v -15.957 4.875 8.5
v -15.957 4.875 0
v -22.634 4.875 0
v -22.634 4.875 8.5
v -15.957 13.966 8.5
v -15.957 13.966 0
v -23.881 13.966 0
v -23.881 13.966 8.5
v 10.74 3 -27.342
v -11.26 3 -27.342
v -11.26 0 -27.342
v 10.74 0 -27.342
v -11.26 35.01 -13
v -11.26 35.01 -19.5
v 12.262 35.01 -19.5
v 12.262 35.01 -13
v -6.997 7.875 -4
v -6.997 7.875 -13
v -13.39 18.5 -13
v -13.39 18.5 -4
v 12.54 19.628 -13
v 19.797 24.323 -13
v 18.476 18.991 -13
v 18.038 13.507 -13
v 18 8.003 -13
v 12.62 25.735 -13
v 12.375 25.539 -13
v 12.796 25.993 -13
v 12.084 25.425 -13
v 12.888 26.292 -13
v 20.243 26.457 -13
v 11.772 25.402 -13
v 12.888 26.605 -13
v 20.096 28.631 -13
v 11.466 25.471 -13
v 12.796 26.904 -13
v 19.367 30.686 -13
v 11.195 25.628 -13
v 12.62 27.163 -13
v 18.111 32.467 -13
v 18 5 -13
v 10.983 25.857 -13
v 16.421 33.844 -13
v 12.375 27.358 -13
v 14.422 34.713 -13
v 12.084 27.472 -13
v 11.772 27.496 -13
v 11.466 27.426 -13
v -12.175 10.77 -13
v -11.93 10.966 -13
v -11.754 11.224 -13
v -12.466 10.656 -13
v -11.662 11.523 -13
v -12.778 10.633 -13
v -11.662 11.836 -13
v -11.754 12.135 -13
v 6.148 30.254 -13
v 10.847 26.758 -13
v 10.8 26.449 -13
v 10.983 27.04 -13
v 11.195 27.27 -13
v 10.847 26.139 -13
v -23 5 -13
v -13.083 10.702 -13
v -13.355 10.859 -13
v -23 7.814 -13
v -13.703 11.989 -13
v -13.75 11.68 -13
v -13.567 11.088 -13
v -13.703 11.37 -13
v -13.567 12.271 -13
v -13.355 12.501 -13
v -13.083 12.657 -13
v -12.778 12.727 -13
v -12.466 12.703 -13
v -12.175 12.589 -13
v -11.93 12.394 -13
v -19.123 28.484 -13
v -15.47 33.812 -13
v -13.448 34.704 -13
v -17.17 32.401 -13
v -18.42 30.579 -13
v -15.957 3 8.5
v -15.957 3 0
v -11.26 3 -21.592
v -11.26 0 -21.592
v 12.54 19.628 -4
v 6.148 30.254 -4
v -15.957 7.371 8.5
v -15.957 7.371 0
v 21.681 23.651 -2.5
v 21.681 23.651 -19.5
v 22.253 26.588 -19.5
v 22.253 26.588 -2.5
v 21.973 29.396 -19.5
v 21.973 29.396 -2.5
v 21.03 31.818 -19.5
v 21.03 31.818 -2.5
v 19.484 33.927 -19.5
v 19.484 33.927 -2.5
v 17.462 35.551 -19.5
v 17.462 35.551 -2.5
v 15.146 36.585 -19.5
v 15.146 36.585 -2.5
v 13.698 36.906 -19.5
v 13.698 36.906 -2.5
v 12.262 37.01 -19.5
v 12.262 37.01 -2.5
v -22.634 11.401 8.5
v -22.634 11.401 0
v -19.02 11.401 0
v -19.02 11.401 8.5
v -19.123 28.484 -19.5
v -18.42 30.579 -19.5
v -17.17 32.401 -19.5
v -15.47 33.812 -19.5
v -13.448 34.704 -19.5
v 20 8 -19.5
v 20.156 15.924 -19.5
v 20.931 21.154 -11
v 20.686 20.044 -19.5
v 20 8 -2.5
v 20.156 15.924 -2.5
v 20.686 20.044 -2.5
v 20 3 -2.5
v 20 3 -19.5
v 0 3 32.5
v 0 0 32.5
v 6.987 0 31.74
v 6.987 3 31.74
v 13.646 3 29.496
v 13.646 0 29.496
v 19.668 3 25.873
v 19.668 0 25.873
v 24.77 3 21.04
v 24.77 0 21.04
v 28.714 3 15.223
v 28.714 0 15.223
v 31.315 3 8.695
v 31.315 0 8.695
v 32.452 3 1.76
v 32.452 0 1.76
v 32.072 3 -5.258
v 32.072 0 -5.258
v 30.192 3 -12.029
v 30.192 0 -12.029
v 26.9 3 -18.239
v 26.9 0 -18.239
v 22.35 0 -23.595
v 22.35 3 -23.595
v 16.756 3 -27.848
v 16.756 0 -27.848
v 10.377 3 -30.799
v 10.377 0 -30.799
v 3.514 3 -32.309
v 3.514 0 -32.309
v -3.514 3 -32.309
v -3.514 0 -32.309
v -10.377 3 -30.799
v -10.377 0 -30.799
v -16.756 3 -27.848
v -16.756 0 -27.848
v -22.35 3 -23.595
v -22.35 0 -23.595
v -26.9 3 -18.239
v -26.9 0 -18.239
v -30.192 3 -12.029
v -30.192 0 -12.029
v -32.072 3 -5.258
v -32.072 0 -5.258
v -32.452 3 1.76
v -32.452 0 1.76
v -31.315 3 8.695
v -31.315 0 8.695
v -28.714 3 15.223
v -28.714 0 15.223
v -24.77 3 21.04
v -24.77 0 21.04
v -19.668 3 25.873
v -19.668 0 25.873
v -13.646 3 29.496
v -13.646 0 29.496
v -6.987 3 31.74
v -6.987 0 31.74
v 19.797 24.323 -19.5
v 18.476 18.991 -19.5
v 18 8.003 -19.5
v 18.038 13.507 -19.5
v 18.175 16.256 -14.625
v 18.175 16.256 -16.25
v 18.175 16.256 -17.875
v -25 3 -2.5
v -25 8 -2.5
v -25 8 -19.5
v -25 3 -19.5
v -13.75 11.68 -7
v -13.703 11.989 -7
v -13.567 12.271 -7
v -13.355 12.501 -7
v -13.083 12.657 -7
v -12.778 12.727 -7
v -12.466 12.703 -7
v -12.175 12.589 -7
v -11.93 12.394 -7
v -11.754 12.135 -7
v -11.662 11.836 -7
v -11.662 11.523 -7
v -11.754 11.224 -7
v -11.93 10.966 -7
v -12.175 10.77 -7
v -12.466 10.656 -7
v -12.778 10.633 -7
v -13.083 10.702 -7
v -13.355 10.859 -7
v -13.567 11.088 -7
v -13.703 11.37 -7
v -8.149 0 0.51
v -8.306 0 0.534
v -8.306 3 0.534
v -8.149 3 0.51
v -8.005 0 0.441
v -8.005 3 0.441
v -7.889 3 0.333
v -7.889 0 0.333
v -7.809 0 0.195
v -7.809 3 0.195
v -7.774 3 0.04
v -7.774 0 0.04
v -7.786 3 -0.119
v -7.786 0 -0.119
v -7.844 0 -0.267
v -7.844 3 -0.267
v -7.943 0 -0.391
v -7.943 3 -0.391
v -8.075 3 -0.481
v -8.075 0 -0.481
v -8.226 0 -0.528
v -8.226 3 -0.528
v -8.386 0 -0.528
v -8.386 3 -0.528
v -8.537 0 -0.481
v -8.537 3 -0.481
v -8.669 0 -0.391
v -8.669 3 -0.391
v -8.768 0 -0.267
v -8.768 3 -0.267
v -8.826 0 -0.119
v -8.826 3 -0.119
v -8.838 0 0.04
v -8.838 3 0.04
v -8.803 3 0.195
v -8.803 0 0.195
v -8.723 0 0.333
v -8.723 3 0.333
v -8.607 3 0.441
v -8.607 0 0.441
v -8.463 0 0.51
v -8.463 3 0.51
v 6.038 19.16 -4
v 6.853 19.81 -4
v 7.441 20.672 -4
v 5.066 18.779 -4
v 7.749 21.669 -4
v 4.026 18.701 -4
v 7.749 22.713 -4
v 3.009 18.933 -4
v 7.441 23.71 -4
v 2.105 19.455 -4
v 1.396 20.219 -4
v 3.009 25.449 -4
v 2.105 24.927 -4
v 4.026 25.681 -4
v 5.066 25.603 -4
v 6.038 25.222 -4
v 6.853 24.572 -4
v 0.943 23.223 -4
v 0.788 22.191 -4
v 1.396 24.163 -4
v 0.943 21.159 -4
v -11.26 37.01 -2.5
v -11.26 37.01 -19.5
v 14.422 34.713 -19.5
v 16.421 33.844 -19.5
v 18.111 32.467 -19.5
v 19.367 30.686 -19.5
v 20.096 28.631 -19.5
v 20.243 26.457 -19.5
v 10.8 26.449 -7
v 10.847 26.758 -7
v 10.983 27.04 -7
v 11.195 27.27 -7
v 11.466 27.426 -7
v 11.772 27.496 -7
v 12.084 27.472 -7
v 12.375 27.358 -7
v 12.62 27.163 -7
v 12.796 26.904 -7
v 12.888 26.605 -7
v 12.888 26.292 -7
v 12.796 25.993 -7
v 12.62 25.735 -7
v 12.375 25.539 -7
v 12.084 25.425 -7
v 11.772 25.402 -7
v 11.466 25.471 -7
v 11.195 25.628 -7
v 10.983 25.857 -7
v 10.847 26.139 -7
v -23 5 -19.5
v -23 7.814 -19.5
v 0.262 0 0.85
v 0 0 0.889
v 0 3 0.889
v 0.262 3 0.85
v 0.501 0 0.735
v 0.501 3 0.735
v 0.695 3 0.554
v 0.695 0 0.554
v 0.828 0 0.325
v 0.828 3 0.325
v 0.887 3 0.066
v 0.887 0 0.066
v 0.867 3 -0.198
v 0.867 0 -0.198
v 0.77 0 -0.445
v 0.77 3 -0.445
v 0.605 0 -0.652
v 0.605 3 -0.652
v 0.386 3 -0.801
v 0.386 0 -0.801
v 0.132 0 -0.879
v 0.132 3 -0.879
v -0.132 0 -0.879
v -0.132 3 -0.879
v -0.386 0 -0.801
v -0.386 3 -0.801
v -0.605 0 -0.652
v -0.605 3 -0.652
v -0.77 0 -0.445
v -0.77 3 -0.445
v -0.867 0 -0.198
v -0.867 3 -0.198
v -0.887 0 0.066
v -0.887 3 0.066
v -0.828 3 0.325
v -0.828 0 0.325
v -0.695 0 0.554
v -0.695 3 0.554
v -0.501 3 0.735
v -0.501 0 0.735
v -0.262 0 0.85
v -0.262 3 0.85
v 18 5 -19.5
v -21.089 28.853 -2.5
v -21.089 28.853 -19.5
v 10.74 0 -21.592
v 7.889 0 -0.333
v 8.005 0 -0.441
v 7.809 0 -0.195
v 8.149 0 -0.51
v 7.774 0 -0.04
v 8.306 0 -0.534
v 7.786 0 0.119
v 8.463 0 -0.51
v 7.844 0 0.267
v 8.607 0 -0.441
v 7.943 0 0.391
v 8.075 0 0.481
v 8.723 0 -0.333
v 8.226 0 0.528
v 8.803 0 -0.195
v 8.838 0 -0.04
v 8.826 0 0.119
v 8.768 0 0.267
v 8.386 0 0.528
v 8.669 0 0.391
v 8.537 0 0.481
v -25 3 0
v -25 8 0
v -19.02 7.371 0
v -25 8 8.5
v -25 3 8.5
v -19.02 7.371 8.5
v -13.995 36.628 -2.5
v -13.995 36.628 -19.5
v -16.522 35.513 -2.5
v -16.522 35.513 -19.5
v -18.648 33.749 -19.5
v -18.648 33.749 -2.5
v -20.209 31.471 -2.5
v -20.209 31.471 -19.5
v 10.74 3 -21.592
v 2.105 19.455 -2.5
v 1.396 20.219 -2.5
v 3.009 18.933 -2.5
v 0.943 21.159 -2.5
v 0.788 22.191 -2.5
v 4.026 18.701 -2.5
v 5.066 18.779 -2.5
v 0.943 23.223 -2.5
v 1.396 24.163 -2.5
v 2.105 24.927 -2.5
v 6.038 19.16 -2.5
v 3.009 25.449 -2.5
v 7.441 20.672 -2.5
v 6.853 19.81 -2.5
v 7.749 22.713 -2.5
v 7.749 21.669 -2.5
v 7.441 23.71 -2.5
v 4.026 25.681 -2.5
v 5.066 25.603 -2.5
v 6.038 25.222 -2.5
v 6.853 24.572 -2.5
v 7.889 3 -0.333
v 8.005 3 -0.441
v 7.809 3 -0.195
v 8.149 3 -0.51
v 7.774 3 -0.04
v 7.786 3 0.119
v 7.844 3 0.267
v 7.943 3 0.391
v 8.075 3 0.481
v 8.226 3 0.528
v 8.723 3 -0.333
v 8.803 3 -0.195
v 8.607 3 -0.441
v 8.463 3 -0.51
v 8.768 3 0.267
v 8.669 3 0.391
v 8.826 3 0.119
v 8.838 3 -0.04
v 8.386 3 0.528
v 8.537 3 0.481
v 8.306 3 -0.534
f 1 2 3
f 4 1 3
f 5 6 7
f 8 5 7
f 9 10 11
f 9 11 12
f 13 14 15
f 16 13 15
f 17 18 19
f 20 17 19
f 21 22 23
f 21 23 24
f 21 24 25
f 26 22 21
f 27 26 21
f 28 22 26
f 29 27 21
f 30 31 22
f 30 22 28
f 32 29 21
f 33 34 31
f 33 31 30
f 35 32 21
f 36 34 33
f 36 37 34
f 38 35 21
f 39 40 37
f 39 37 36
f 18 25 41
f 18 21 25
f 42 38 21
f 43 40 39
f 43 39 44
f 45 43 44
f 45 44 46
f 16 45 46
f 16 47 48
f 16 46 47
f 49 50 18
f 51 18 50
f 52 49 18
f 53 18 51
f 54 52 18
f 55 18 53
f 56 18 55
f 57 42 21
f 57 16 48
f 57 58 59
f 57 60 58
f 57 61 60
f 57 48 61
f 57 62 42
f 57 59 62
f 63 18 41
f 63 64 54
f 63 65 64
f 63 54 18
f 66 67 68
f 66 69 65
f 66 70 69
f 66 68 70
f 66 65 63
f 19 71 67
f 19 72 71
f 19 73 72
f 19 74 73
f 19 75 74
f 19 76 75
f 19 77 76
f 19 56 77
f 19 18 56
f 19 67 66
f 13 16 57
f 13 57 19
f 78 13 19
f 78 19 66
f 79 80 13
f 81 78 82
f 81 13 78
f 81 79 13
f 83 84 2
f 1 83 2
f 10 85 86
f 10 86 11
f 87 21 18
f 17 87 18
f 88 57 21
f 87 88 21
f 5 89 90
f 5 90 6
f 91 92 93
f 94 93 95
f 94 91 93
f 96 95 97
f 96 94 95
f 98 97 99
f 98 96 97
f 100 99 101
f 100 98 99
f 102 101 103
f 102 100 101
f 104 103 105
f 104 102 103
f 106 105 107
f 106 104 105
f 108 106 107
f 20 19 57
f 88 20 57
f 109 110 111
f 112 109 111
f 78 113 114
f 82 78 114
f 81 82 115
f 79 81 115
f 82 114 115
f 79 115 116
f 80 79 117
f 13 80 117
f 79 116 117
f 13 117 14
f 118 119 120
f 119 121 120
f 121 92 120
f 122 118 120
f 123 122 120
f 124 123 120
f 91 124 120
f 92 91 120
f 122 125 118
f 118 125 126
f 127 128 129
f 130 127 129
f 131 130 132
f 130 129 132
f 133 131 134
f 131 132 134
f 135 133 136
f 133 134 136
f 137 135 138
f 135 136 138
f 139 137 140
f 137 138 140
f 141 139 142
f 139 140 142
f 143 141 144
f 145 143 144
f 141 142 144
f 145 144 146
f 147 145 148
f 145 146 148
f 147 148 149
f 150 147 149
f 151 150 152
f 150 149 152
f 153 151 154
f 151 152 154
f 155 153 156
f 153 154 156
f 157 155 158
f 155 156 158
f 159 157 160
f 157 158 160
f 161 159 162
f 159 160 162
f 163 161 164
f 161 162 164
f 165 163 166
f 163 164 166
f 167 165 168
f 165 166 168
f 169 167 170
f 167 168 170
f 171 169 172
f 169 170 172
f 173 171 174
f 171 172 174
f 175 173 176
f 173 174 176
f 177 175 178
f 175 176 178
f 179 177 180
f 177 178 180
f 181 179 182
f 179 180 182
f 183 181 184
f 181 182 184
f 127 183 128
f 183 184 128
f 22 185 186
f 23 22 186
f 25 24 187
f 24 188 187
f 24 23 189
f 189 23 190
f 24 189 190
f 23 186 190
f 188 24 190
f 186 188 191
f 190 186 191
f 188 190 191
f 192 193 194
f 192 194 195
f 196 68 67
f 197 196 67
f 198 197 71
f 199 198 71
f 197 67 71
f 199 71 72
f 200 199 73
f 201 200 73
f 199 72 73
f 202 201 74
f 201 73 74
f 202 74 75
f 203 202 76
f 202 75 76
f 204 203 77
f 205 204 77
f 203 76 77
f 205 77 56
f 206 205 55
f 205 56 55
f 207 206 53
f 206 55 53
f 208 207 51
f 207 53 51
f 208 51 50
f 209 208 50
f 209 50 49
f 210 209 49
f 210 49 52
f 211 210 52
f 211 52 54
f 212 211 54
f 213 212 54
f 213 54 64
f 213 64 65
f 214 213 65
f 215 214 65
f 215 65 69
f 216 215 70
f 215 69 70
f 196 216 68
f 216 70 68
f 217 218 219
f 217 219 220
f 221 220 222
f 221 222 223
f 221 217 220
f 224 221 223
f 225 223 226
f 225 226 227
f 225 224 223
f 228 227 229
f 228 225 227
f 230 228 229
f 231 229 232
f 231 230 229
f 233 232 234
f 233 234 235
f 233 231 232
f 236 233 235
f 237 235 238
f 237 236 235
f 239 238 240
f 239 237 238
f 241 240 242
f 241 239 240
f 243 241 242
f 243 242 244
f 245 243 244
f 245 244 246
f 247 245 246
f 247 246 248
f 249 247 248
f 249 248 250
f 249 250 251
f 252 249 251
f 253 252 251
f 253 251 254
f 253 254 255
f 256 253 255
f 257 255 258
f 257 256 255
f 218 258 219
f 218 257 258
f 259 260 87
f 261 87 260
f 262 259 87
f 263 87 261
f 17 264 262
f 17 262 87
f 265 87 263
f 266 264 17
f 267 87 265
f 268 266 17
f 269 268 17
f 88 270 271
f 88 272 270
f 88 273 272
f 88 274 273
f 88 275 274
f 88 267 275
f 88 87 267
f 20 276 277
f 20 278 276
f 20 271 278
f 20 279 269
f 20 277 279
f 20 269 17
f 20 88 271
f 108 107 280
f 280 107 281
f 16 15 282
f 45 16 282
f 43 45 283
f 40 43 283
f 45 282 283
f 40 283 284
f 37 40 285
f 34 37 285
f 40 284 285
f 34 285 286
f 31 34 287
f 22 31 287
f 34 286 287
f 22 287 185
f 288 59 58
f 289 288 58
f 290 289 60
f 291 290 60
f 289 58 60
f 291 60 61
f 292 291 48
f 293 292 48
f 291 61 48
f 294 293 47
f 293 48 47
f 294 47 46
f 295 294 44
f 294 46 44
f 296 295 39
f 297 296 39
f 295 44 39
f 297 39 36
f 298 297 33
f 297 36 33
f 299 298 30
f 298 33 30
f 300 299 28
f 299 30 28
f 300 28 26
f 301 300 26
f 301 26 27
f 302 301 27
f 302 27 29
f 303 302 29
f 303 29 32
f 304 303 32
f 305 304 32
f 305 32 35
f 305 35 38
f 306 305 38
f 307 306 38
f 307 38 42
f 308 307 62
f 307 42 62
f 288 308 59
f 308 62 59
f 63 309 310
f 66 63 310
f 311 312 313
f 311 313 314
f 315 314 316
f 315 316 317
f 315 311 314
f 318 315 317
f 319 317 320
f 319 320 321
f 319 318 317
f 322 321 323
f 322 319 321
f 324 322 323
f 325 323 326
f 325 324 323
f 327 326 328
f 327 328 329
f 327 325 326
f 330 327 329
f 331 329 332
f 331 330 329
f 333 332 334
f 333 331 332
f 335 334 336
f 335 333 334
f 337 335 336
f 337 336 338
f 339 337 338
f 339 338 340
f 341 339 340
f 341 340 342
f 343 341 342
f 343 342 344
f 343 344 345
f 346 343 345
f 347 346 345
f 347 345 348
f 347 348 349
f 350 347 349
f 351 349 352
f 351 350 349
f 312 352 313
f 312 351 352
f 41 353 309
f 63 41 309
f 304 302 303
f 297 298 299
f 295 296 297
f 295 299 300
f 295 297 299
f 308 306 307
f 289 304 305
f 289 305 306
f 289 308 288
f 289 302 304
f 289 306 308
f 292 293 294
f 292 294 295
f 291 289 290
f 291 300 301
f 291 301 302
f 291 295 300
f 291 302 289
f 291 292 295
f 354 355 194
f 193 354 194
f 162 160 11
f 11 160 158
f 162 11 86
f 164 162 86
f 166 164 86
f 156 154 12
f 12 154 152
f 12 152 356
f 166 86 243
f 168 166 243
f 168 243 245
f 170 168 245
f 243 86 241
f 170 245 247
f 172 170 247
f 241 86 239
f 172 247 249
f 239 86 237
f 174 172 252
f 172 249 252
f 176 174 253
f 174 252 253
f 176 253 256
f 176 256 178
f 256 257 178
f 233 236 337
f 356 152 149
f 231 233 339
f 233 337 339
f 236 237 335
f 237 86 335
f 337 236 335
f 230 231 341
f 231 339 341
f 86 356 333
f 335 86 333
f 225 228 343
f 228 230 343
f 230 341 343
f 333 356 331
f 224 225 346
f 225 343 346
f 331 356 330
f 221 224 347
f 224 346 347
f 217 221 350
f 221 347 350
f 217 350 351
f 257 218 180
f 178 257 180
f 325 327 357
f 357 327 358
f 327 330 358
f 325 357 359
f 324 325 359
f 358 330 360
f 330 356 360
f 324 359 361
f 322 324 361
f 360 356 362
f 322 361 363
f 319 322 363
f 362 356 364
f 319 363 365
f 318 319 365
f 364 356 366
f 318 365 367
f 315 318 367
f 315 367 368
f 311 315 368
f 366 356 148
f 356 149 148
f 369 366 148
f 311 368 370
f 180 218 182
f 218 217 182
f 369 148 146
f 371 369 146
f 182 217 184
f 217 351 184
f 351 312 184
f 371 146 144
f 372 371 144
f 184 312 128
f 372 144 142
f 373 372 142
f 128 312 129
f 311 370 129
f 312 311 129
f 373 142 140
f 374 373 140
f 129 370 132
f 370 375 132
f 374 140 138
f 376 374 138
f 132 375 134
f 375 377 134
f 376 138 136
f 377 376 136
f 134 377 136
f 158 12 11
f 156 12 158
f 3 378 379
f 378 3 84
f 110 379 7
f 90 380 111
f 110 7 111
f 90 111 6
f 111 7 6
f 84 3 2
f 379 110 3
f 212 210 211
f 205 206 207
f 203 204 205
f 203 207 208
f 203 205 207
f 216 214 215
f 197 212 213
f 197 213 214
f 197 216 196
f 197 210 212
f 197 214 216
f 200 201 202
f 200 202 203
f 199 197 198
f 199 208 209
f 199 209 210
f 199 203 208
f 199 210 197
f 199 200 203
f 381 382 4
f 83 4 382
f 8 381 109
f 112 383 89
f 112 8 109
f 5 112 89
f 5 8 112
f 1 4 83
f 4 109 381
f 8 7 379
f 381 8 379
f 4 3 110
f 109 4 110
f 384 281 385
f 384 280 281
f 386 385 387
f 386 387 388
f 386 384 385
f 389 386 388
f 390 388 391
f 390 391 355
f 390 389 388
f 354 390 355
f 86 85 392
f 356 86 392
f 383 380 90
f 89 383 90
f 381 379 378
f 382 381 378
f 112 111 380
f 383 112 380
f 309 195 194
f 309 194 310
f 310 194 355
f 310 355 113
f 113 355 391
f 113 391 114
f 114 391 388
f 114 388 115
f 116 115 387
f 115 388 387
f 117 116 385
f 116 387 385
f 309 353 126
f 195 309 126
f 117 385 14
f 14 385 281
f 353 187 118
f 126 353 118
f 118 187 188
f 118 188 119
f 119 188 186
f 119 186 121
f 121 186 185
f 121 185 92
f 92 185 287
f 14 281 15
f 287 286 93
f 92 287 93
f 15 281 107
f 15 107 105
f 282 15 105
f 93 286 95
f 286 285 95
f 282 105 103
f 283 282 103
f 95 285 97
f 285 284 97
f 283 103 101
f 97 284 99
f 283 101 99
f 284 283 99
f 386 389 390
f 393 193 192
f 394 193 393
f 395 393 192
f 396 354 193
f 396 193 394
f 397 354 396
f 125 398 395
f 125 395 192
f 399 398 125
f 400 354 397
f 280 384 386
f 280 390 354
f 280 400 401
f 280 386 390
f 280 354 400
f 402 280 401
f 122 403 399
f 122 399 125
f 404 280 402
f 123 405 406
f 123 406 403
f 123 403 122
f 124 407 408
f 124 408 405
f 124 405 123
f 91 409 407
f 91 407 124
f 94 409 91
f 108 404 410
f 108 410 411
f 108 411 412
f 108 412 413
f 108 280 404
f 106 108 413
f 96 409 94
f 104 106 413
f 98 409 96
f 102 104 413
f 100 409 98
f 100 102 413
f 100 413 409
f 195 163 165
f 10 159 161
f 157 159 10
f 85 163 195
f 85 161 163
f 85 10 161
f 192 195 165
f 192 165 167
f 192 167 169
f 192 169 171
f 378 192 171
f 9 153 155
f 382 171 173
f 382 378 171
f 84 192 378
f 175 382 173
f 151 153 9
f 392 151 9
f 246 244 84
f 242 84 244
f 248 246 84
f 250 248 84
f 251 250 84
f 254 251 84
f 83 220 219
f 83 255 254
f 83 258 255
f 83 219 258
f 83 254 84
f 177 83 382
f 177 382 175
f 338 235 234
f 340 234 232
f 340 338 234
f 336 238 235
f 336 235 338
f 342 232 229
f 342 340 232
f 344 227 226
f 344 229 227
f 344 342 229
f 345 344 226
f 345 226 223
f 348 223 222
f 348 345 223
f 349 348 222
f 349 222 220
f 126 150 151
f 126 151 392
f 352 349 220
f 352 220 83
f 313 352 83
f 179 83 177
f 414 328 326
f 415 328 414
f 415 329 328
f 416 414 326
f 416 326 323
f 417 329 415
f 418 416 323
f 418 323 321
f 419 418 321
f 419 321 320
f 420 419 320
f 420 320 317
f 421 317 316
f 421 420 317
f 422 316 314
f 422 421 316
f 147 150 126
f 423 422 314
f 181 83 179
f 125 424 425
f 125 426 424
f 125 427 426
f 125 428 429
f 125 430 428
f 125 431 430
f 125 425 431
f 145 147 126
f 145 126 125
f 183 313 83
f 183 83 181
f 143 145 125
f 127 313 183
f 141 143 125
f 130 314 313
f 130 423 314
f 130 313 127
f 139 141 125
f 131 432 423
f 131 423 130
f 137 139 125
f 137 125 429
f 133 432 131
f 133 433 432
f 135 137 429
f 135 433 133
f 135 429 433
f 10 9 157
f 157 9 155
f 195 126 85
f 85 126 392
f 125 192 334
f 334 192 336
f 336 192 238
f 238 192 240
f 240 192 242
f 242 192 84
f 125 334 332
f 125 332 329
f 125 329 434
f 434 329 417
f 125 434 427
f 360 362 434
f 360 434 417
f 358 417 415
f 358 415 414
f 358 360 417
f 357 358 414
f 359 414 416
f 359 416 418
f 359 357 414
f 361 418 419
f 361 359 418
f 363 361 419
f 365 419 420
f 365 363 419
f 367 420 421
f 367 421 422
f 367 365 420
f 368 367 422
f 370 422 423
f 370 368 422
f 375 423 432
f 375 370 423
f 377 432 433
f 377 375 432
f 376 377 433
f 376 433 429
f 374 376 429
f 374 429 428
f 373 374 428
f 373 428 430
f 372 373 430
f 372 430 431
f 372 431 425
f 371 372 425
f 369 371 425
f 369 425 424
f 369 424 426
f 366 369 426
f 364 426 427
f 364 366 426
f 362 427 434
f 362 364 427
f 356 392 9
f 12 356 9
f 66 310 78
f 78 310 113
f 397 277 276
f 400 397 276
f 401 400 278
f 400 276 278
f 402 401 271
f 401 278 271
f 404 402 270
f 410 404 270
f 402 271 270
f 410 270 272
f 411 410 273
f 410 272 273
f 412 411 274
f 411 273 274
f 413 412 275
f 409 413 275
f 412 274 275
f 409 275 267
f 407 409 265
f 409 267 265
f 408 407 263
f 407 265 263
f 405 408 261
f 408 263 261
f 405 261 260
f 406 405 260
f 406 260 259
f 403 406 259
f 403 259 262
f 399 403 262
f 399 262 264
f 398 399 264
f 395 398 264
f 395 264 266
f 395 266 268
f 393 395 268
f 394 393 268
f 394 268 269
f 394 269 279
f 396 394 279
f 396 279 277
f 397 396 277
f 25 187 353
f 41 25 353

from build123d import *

# Parameters (mm, degrees)
SKETCH1_R           = 32.5
SKETCH1_R_2         = 0.889
SKETCH1_R_3         = 0.5335
BOSS_EXTRUDE1_DEPTH = 3
SKETCH2_W           = 45
SKETCH2_H           = 17
BOSS_EXTRUDE2_DEPTH = 5
LOFT1_START         = -19.5
LOFT1_DEPTH         = 17
FILLET2_R           = 10
CUT_EXTRUDE7_DEPTH  = 6.5
CUT_EXTRUDE8_DEPTH  = 9
SKETCH59_R          = 1.05
CUT_EXTRUDE9_DEPTH  = 6
SKETCH60_R          = 3.5
CUT_EXTRUDE10_DEPTH = 62.304245363
BOSS_EXTRUDE3_DEPTH = 11
CUT_EXTRUDE11_REACH = 53.415
SKETCH62_W          = 9.042987319
SKETCH62_H          = 2.5
SKETCH63_W          = 22
SKETCH63_H          = 5.75
CUT_EXTRUDE12_DEPTH = 10


# Read off the part's stored shape, not the designer's step: Loft1
with BuildPart() as part:
    # Sketch1 → Boss-Extrude1 (new body)
    with BuildSketch(Plane(origin=(0, 0, 0), x_dir=(1, 0, 0), z_dir=(0, 1, 0))):
        with Locations(Location((0, 0, 0), (0, 0, 270))):
            Circle(SKETCH1_R)
        with Locations(Location((0, 0, 0), (0, 0, 270))):
            Circle(SKETCH1_R_2, mode=Mode.SUBTRACT)
        with Locations(Location((-8.306, 0, 0), (0, 0, 270))):
            Circle(SKETCH1_R_3, mode=Mode.SUBTRACT)
        with Locations(Location((8.306, 0, 0), (0, 0, 90))):
            Circle(SKETCH1_R_3, mode=Mode.SUBTRACT)
    extrude(amount=BOSS_EXTRUDE1_DEPTH)

    # Sketch2 → Boss-Extrude2 (add)
    with BuildSketch(Plane(origin=(0, 3, 0), x_dir=(1, 0, 0), z_dir=(0, 1, 0))):
        with Locations((-2.5, 11)):
            Rectangle(SKETCH2_W, SKETCH2_H)
    extrude(amount=BOSS_EXTRUDE2_DEPTH)

    # Loft1 outline → Loft1 (add)
    with BuildSketch(Plane.XY.offset(LOFT1_START)):
        with BuildLine():
            Line((-25, 8), (20, 8))
            add(Edge.make_bspline(
                [(20, 8), (20.013119001, 12.366637273), (19.711715011, 23.342908392), (26.277458631, 32.792620463), (30.786821215, 37.0096)],
                knots=[0, 0, 0, 0, 0.412101617, 1, 1, 1, 1], degree=3))
            Line((30.786821215, 37.0096), (-19.558686419, 37.0096))
            Line((-19.558686419, 37.0096), (-25, 8))
        make_face()
    extrude(amount=LOFT1_DEPTH)

    # Fillet2
    fillet2_edges = [part.edges().sort_by_distance(p)[0] for p in [
        (30.786821215, 37.0096, -11),
        (-19.558686419, 37.0096, -11),
    ]]
    fillet(fillet2_edges, radius=FILLET2_R)

    # Sketch56 → Cut-Extrude7 (cut)
    with BuildSketch(Plane(origin=(0, 0, -19.5), x_dir=(-1, 0, 0), z_dir=(0, 0, -1))):
        with BuildLine():
            Line((11.259989716, 35.0096), (-12.262162003, 35.0096))
            ThreePointArc((-12.262162003, 35.0096), (-18.800326154, 31.619633572), (-19.797451062, 24.322702384))
            add(Edge.make_bspline(
                [(-19.797451062, 24.322702384), (-19.33456189, 23.024549565), (-18.970633179, 21.699807372), (-18.444923303, 18.9960086), (-18.278988003, 17.628977113), (-18.070720499, 14.883614823), (-18.028473243, 13.506968306), (-17.995025378, 10.755326884), (-18.004134147, 9.379048249), (-18, 8.003004365)],
                knots=[0, 0, 0, 0, 0.25, 0.25, 0.5, 0.5, 0.75, 0.75, 1, 1, 1, 1], degree=3))
            Line((-18, 8.003004365), (-18, 5))
            Line((-18, 5), (23, 5))
            Line((23, 5), (23, 7.814051971))
            Line((23, 7.814051971), (19.122868337, 28.484435511))
            ThreePointArc((19.122868337, 28.484435511), (16.368870019, 33.165844151), (11.259989716, 35.0096))
        make_face()
    extrude(amount=-CUT_EXTRUDE7_DEPTH, mode=Mode.SUBTRACT)

    # Sketch57 → Cut-Extrude8 (cut)
    with BuildSketch(Plane(origin=(0, 0, -13), x_dir=(-1, 0, 0), z_dir=(0, 0, -1))):
        Polygon((-6.147589592, 30.253616288), (-12.539757722, 19.62816634), (6.997359924, 7.874824939), (13.389528054, 18.500274887), align=None)
    extrude(amount=-CUT_EXTRUDE8_DEPTH, mode=Mode.SUBTRACT)

    # Sketch59 → Cut-Extrude9 (cut)
    with BuildSketch(Plane(origin=(0, 0, -13), x_dir=(-1, 0, 0), z_dir=(0, 0, -1))):
        with Locations((-11.850080197, 26.448721296)):
            Circle(SKETCH59_R)
        with Locations((12.699850529, 11.679719931)):
            Circle(SKETCH59_R)
    extrude(amount=-CUT_EXTRUDE9_DEPTH, mode=Mode.SUBTRACT)

    # Sketch60 → Cut-Extrude10 (cut, through all)
    with BuildSketch(Plane(origin=(0, 0, -4), x_dir=(-1, 0, 0), z_dir=(0, 0, -1))):
        with Locations((-4.287675332, 22.191003874)):
            Circle(SKETCH60_R)
    extrude(amount=-CUT_EXTRUDE10_DEPTH, mode=Mode.SUBTRACT)

    # Sketch61 → Boss-Extrude3 (add)
    with BuildSketch(Plane.XY.offset(-2.5)):
        Polygon((-25, 3), (-15.957012681, 3), (-15.957012681, 4.875346451), (-22.634257591, 4.875346451), (-22.634257591, 8.517700202), (-22.634257591, 11.401095106), (-19.020402646, 11.401095106), (-19.020402646, 7.370992949), (-15.957012681, 7.370992949), (-15.957012681, 13.965550524), (-23.881045203, 13.965550524), (-25, 8), align=None)
    extrude(amount=BOSS_EXTRUDE3_DEPTH)

    # Cut-Extrude11: up to this face of the body (flat: up to its plane)
    cut_extrude11_end = Plane(part.part.faces().sort_by_distance((1.612350985, 3, 3.31348115))[0])
    # Sketch62 → Cut-Extrude11 (cut, up to the picked face)
    with BuildSketch(Plane(origin=(0, 13.965550524, 0), x_dir=(1, 0, 0), z_dir=(0, 1, 0)), mode=Mode.PRIVATE) as cut_extrude11_sk1:
        with Locations((-20.478506341, 1.25)):
            Rectangle(SKETCH62_W, SKETCH62_H)
    cut_extrude11_tool1 = split(extrude(cut_extrude11_sk1.sketch, amount=-CUT_EXTRUDE11_REACH, mode=Mode.PRIVATE), bisect_by=cut_extrude11_end, keep=Keep.BOTH, mode=Mode.PRIVATE)
    add(cut_extrude11_tool1.solids().sort_by(Axis((-20.478506, 13.965551, -1.25), (0, -1, 0)))[0], mode=Mode.SUBTRACT)

    # Sketch63 → Cut-Extrude12 (cut)
    with BuildSketch(Plane(origin=(0, 3, 0), x_dir=(1, 0, 0), z_dir=(0, 1, 0))):
        with Locations((-0.259989716, 24.466538137)):
            Rectangle(SKETCH63_W, SKETCH63_H)
    extrude(amount=-CUT_EXTRUDE12_DEPTH, mode=Mode.SUBTRACT)


solid = part.part
